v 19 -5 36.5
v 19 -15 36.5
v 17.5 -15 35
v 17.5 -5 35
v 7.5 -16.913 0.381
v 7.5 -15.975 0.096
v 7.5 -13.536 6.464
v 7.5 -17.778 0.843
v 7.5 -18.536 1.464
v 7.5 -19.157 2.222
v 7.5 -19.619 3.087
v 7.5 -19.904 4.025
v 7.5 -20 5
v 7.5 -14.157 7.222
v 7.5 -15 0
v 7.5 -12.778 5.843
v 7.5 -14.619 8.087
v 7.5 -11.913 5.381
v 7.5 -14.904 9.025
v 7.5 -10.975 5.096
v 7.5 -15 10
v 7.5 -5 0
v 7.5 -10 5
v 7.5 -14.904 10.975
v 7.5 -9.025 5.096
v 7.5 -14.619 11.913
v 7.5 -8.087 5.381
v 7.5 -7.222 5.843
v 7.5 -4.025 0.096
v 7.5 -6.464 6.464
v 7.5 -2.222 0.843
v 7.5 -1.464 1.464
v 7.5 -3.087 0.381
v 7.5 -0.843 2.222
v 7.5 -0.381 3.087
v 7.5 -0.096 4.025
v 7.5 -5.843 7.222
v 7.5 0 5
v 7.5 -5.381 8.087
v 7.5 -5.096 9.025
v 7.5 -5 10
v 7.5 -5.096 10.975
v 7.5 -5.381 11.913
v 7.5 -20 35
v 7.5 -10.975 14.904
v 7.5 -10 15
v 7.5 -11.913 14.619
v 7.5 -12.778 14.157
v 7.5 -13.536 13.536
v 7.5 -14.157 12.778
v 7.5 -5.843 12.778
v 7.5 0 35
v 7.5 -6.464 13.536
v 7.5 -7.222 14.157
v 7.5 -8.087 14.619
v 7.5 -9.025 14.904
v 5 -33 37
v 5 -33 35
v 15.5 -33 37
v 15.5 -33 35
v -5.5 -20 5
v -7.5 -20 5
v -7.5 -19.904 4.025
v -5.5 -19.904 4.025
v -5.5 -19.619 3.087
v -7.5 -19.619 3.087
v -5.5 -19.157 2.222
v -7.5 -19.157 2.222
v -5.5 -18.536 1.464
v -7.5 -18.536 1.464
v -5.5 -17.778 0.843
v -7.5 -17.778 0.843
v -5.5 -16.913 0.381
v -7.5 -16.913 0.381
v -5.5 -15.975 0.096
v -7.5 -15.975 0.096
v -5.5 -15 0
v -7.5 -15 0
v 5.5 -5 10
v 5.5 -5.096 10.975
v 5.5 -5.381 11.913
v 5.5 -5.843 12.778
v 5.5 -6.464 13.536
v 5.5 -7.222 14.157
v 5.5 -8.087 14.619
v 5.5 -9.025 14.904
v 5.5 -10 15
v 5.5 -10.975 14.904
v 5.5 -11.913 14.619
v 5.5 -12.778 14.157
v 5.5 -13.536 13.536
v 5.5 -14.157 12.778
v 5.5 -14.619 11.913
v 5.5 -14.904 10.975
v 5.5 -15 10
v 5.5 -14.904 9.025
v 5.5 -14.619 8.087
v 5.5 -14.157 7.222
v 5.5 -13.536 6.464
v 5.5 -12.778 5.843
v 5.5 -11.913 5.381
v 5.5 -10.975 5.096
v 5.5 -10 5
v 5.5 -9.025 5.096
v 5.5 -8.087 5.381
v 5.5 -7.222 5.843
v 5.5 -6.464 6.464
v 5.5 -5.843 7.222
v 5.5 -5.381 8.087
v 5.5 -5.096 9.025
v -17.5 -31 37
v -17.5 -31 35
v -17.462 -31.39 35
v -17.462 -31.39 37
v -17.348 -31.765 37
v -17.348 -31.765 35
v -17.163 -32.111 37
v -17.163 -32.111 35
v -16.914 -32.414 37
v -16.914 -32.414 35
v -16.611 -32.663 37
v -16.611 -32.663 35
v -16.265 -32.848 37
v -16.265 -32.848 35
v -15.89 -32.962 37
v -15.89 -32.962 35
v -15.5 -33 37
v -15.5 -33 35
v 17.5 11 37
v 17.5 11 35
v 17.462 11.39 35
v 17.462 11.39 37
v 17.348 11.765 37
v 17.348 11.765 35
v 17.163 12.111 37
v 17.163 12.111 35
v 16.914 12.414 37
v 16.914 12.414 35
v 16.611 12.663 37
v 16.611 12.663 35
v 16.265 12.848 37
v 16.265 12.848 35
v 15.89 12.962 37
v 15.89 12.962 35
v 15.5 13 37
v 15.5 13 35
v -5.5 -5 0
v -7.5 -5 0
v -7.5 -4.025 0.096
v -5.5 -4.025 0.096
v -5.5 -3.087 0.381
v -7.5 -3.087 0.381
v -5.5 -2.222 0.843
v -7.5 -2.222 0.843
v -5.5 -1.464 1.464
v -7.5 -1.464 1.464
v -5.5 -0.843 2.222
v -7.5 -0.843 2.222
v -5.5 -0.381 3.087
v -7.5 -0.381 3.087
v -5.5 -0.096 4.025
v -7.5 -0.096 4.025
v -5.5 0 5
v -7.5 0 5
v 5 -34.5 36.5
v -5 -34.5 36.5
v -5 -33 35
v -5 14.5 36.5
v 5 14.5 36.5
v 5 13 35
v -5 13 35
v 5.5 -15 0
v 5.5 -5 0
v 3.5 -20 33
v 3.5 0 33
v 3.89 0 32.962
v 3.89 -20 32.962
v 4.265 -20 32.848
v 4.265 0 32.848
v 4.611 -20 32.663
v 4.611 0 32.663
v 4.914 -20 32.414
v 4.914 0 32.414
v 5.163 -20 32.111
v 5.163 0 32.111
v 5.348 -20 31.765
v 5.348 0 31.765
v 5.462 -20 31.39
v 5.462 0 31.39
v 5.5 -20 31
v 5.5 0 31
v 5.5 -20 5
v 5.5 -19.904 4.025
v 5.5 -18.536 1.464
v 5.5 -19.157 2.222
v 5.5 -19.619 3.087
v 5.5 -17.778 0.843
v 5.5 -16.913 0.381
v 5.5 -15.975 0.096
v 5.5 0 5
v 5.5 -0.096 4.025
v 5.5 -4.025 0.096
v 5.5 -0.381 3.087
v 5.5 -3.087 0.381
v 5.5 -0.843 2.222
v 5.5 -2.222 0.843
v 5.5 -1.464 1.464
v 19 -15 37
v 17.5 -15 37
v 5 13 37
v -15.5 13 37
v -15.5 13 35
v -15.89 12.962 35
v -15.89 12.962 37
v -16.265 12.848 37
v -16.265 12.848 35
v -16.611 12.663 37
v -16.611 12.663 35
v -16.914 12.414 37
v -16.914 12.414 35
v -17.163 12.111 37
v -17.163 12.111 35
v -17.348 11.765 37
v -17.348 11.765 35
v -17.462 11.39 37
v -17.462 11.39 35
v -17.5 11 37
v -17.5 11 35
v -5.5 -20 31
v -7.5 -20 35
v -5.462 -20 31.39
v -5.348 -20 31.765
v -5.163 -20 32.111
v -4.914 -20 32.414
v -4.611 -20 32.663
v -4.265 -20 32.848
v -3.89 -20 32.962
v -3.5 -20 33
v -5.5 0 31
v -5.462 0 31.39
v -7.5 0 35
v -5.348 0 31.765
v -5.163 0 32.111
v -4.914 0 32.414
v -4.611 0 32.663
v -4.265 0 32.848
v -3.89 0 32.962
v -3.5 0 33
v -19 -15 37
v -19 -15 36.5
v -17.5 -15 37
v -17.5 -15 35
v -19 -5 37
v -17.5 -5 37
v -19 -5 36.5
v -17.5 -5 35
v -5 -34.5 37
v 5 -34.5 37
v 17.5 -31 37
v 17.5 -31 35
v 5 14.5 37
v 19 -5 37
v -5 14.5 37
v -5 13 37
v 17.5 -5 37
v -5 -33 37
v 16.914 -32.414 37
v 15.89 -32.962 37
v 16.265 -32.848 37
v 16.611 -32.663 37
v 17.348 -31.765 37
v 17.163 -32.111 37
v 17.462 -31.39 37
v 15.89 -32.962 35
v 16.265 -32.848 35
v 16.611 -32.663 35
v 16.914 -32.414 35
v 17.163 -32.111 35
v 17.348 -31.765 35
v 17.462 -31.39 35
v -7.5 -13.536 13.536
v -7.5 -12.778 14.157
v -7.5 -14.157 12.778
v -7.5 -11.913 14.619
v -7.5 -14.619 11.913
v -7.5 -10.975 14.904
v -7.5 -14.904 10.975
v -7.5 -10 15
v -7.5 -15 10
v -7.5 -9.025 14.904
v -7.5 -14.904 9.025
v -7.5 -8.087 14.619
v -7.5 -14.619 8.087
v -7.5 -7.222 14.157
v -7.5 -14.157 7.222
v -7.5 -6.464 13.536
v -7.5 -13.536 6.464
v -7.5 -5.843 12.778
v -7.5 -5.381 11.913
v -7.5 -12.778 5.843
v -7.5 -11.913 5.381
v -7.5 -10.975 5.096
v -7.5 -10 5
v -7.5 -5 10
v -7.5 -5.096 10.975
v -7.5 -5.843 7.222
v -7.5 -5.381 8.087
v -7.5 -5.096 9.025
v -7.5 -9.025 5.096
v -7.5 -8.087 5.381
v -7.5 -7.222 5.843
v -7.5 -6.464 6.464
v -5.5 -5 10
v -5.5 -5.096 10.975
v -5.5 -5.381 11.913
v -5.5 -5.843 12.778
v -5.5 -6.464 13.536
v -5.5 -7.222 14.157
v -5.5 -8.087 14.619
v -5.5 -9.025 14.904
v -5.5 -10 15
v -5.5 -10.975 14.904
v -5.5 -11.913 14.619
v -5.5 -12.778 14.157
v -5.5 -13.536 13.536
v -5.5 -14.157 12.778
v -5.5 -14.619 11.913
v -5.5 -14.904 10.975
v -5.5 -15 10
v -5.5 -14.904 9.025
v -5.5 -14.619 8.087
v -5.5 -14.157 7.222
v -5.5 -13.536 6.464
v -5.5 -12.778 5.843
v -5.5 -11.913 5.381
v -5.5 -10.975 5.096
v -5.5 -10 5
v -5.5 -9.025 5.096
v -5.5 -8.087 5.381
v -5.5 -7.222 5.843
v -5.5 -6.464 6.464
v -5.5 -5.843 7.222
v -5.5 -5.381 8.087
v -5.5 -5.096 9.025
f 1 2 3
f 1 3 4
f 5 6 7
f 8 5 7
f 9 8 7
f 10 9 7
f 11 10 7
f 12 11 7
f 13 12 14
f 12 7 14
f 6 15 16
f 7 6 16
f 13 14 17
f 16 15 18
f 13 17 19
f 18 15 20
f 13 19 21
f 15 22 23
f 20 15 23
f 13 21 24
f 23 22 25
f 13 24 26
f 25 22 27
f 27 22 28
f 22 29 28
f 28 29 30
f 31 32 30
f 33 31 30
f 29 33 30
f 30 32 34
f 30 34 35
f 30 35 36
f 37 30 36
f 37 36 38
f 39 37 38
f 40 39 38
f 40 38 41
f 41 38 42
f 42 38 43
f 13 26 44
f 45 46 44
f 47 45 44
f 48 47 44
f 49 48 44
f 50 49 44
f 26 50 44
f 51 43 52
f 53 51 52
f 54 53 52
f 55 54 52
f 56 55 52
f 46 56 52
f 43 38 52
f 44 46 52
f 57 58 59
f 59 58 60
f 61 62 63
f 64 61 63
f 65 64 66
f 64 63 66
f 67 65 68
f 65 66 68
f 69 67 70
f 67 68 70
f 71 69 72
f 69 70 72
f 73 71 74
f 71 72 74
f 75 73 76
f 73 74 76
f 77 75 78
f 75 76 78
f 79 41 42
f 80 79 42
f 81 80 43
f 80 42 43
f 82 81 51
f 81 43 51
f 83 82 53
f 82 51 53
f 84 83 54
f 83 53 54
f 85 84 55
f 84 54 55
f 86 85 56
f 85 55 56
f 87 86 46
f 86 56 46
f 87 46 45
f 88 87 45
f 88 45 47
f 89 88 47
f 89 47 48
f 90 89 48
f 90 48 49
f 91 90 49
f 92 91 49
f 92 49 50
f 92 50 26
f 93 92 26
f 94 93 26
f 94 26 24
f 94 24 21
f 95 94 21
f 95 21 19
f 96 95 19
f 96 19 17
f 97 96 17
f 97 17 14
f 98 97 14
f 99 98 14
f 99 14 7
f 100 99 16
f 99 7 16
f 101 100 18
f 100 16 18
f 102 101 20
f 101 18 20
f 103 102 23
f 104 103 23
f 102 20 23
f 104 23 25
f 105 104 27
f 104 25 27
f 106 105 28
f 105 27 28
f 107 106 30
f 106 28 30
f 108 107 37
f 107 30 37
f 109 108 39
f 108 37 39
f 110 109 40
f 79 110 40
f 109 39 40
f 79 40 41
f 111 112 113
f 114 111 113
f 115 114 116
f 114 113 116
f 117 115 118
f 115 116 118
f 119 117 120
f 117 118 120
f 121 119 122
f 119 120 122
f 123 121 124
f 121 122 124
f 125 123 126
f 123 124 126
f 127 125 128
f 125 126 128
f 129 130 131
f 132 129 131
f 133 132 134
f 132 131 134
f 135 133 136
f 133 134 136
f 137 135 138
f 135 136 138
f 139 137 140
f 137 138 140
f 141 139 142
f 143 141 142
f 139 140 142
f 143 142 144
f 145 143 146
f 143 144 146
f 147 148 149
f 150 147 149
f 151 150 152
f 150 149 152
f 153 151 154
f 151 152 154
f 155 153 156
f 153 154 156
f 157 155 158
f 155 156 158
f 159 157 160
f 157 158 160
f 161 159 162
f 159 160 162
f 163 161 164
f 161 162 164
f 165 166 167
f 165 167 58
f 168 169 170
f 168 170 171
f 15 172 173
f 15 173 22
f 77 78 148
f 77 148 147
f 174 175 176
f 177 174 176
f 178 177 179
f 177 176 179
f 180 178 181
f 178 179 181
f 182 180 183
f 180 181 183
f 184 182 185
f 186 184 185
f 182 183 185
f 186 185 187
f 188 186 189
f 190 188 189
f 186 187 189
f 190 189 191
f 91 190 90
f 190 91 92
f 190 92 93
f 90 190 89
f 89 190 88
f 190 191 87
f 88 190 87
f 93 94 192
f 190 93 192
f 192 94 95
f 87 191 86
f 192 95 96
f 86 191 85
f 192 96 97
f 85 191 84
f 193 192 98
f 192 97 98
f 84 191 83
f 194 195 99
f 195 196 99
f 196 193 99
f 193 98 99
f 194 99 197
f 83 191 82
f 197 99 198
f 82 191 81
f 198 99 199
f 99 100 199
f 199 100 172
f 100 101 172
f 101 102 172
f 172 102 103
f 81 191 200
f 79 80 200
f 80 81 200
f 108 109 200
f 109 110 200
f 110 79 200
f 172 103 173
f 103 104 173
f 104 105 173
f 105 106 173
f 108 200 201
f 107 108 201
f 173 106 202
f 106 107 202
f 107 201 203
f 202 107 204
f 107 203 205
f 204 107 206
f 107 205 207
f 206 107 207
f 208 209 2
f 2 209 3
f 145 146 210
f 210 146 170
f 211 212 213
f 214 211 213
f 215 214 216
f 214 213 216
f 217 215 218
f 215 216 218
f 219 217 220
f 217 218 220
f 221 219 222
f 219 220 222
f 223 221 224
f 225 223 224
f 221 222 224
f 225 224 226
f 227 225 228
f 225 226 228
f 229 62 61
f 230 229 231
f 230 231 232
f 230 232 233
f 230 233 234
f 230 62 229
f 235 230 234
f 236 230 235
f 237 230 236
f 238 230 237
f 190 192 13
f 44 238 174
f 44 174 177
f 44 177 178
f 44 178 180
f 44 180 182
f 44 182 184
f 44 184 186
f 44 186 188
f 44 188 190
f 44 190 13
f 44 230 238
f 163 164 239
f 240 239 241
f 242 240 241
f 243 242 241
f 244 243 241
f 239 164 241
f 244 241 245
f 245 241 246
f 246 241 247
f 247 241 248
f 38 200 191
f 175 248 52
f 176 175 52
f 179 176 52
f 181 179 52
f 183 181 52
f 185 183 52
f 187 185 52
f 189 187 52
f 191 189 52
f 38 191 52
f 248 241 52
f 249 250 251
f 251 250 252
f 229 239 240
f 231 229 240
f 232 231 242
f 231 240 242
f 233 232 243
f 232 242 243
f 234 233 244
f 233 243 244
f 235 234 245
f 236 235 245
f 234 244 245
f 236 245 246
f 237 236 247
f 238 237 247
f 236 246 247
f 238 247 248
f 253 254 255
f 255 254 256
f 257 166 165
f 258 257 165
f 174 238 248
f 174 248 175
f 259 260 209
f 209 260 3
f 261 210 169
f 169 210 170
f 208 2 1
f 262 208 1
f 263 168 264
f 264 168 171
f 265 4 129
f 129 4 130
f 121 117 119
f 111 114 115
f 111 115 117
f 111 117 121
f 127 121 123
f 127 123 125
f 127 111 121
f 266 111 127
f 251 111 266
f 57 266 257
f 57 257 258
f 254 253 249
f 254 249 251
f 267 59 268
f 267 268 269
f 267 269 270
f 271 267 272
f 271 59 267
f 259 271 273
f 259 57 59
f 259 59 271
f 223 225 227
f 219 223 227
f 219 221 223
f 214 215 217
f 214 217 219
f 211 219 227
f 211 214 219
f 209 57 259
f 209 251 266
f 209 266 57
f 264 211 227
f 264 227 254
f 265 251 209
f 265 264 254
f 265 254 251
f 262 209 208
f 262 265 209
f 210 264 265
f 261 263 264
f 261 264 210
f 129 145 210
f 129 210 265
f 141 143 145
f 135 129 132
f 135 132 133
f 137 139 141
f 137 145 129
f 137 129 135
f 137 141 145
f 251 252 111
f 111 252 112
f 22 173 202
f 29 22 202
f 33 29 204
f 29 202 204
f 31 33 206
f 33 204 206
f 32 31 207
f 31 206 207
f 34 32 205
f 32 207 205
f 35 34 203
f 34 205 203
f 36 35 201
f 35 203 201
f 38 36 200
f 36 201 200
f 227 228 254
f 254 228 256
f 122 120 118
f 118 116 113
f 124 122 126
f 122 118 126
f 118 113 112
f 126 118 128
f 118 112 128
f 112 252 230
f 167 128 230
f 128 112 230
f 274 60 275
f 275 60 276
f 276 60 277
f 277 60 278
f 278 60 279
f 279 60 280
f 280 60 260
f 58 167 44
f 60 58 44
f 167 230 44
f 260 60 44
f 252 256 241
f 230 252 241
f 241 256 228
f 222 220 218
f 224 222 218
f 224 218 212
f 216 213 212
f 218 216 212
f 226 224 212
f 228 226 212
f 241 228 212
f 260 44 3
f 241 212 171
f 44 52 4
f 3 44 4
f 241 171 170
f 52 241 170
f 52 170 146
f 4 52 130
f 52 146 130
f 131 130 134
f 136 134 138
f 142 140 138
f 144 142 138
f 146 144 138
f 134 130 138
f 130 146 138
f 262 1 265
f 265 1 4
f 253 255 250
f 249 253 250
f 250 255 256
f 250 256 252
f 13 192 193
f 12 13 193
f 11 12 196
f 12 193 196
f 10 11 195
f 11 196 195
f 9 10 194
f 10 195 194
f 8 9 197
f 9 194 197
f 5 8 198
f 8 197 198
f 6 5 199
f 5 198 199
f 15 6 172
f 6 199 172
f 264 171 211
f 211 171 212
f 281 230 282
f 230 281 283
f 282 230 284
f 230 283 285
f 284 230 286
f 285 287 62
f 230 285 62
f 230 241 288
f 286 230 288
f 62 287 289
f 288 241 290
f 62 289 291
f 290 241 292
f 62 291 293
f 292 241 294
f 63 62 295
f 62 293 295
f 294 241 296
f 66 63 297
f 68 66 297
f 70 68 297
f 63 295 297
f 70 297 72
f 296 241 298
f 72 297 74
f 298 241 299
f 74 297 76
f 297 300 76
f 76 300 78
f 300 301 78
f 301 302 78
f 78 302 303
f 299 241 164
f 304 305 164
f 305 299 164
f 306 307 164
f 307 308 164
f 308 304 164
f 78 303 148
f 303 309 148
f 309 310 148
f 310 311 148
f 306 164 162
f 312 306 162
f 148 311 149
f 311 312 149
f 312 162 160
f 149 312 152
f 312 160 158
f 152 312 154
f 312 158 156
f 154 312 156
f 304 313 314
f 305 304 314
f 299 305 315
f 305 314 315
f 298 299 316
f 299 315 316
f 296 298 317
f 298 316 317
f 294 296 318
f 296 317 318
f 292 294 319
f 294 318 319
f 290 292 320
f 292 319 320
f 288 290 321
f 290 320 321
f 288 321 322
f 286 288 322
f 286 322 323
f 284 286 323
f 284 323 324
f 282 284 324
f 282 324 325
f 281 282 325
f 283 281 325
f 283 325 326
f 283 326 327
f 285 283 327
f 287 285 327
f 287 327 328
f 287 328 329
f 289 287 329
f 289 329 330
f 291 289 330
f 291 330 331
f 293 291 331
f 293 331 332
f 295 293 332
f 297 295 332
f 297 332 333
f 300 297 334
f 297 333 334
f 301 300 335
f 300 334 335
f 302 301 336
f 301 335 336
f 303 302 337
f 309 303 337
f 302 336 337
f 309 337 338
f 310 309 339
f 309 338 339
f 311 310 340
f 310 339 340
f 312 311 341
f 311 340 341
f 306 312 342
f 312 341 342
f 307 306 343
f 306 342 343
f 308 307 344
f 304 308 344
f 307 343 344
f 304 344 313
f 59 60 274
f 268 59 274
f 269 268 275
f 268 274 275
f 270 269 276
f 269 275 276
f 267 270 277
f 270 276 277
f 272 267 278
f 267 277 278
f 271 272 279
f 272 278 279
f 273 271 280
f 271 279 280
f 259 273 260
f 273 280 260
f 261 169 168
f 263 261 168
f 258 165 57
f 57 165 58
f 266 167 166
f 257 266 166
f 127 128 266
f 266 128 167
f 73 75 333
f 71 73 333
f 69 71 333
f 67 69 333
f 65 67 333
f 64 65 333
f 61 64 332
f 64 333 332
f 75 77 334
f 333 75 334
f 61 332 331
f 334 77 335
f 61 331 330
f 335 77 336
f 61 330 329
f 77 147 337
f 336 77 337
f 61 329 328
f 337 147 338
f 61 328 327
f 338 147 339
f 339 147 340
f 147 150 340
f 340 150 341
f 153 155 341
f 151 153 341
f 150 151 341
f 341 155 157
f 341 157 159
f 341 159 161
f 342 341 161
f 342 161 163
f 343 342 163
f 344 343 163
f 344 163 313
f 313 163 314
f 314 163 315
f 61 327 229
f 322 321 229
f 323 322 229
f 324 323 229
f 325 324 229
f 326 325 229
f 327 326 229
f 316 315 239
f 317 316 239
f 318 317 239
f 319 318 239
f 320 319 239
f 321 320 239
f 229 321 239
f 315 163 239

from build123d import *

# Parameters (mm, degrees)
F1_DEPTH = 20
F3_D     = 10
F3_DEPTH = 45
F3_TIP   = 3.0043030951
F4_W     = 15
F4_H     = 20
F5_DEPTH = 2
F6_DEPTH = 26.501
F7_SIZE  = 1.5


with BuildPart() as f1:
    # F0 (on Front) → F1 (new body)
    with BuildSketch(Plane.XZ):
        with BuildLine():
            Line((7.5, 35), (0, 35))
            Line((0, 35), (-7.5, 35))
            Line((-7.5, 35), (-7.5, 0))
            Line((-7.5, 0), (-5.5, 0))
            Line((-5.5, 0), (-5.5, 31))
            ThreePointArc((-5.5, 31), (-4.9142135624, 32.4142135624), (-3.5, 33))
            Line((-3.5, 33), (0, 33))
            Line((0, 33), (3.5, 33))
            ThreePointArc((3.5, 33), (4.9142135624, 32.4142135624), (5.5, 31))
            Line((5.5, 31), (5.5, 0))
            Line((5.5, 0), (7.5, 0))
            Line((7.5, 0), (7.5, 35))
        make_face()
    extrude(amount=F1_DEPTH)

    # F3
    with Locations(Plane(origin=(-7.5, 0, 0), x_dir=(0, -1, 0), z_dir=(-1, 0, 0))):
        with Locations((10, 10)):
            Hole(F3_D / 2, depth=F3_DEPTH)
            with Locations((0, 0, -(F3_DEPTH + F3_TIP / 2))):  # 118° drill point
                Cone(0, F3_D / 2, F3_TIP, mode=Mode.SUBTRACT)

    # F4 (on face) → F5 (join)
    with BuildSketch(Plane.XY.offset(35)):
        with BuildLine():
            Line((5, -33), (15.5, -33))
            ThreePointArc((15.5, -33), (16.9142135624, -32.4142135624), (17.5, -31))
            Line((17.5, -31), (17.5, -15))
            Line((17.5, -15), (17.5, -5))
            Line((17.5, -5), (17.5, 11))
            ThreePointArc((17.5, 11), (16.9142135624, 12.4142135624), (15.5, 13))
            Line((15.5, 13), (5, 13))
            Line((5, 13), (0, 13))
            Line((0, 13), (-5, 13))
            Line((-5, 13), (-15.5, 13))
            ThreePointArc((-15.5, 13), (-16.9142135624, 12.4142135624), (-17.5, 11))
            Line((-17.5, 11), (-17.5, -5))
            Line((-17.5, -5), (-17.5, -10))
            Line((-17.5, -10), (-17.5, -15))
            Line((-17.5, -15), (-17.5, -31))
            ThreePointArc((-17.5, -31), (-16.9142135624, -32.4142135624), (-15.5, -33))
            Line((-15.5, -33), (-5, -33))
            Line((-5, -33), (5, -33))
        make_face()
        with Locations((0, -10)):
            Rectangle(F4_W, F4_H, mode=Mode.SUBTRACT)
        Polygon((5, -34.5), (5, -33), (-5, -33), (-5, -34.5), (0, -34.5), align=None)
        Polygon((17.5, -5), (17.5, -15), (19, -15), (19, -10), (19, -5), align=None)
        Polygon((-19, -15), (-17.5, -15), (-17.5, -10), (-17.5, -5), (-19, -5), (-19, -10), align=None)
        Polygon((0, 13), (5, 13), (5, 14.5), (0, 14.5), (-5, 14.5), (-5, 13), align=None)
        with Locations((0, -10)):
            Rectangle(F4_W, F4_H)
    extrude(amount=F5_DEPTH)

    # F2 (on face) → F6 (cut, through all)
    with BuildSketch(Plane(origin=(-7.5, 0, 0), x_dir=(0, -1, 0), z_dir=(-1, 0, 0))):
        with BuildLine():
            Line((20, 0), (20, 5))
            ThreePointArc((20, 5), (18.5355339059, 1.4644660941), (15, 0))
            Line((15, 0), (20, 0))
        make_face()
        with BuildLine():
            ThreePointArc((5, 0), (1.4644660941, 1.4644660941), (0, 5))
            Line((0, 5), (0, 0))
            Line((0, 0), (5, 0))
        make_face()
    extrude(amount=-F6_DEPTH, mode=Mode.SUBTRACT)

    # F7
    f7_edges = [f1.edges().sort_by_distance(p)[0] for p in [
        (-19, -10, 35),
        (0, 14.5, 35),
        (19, -10, 35),
        (0, -34.5, 35),
    ]]
    chamfer(f7_edges, length=F7_SIZE)


solid = f1.part
